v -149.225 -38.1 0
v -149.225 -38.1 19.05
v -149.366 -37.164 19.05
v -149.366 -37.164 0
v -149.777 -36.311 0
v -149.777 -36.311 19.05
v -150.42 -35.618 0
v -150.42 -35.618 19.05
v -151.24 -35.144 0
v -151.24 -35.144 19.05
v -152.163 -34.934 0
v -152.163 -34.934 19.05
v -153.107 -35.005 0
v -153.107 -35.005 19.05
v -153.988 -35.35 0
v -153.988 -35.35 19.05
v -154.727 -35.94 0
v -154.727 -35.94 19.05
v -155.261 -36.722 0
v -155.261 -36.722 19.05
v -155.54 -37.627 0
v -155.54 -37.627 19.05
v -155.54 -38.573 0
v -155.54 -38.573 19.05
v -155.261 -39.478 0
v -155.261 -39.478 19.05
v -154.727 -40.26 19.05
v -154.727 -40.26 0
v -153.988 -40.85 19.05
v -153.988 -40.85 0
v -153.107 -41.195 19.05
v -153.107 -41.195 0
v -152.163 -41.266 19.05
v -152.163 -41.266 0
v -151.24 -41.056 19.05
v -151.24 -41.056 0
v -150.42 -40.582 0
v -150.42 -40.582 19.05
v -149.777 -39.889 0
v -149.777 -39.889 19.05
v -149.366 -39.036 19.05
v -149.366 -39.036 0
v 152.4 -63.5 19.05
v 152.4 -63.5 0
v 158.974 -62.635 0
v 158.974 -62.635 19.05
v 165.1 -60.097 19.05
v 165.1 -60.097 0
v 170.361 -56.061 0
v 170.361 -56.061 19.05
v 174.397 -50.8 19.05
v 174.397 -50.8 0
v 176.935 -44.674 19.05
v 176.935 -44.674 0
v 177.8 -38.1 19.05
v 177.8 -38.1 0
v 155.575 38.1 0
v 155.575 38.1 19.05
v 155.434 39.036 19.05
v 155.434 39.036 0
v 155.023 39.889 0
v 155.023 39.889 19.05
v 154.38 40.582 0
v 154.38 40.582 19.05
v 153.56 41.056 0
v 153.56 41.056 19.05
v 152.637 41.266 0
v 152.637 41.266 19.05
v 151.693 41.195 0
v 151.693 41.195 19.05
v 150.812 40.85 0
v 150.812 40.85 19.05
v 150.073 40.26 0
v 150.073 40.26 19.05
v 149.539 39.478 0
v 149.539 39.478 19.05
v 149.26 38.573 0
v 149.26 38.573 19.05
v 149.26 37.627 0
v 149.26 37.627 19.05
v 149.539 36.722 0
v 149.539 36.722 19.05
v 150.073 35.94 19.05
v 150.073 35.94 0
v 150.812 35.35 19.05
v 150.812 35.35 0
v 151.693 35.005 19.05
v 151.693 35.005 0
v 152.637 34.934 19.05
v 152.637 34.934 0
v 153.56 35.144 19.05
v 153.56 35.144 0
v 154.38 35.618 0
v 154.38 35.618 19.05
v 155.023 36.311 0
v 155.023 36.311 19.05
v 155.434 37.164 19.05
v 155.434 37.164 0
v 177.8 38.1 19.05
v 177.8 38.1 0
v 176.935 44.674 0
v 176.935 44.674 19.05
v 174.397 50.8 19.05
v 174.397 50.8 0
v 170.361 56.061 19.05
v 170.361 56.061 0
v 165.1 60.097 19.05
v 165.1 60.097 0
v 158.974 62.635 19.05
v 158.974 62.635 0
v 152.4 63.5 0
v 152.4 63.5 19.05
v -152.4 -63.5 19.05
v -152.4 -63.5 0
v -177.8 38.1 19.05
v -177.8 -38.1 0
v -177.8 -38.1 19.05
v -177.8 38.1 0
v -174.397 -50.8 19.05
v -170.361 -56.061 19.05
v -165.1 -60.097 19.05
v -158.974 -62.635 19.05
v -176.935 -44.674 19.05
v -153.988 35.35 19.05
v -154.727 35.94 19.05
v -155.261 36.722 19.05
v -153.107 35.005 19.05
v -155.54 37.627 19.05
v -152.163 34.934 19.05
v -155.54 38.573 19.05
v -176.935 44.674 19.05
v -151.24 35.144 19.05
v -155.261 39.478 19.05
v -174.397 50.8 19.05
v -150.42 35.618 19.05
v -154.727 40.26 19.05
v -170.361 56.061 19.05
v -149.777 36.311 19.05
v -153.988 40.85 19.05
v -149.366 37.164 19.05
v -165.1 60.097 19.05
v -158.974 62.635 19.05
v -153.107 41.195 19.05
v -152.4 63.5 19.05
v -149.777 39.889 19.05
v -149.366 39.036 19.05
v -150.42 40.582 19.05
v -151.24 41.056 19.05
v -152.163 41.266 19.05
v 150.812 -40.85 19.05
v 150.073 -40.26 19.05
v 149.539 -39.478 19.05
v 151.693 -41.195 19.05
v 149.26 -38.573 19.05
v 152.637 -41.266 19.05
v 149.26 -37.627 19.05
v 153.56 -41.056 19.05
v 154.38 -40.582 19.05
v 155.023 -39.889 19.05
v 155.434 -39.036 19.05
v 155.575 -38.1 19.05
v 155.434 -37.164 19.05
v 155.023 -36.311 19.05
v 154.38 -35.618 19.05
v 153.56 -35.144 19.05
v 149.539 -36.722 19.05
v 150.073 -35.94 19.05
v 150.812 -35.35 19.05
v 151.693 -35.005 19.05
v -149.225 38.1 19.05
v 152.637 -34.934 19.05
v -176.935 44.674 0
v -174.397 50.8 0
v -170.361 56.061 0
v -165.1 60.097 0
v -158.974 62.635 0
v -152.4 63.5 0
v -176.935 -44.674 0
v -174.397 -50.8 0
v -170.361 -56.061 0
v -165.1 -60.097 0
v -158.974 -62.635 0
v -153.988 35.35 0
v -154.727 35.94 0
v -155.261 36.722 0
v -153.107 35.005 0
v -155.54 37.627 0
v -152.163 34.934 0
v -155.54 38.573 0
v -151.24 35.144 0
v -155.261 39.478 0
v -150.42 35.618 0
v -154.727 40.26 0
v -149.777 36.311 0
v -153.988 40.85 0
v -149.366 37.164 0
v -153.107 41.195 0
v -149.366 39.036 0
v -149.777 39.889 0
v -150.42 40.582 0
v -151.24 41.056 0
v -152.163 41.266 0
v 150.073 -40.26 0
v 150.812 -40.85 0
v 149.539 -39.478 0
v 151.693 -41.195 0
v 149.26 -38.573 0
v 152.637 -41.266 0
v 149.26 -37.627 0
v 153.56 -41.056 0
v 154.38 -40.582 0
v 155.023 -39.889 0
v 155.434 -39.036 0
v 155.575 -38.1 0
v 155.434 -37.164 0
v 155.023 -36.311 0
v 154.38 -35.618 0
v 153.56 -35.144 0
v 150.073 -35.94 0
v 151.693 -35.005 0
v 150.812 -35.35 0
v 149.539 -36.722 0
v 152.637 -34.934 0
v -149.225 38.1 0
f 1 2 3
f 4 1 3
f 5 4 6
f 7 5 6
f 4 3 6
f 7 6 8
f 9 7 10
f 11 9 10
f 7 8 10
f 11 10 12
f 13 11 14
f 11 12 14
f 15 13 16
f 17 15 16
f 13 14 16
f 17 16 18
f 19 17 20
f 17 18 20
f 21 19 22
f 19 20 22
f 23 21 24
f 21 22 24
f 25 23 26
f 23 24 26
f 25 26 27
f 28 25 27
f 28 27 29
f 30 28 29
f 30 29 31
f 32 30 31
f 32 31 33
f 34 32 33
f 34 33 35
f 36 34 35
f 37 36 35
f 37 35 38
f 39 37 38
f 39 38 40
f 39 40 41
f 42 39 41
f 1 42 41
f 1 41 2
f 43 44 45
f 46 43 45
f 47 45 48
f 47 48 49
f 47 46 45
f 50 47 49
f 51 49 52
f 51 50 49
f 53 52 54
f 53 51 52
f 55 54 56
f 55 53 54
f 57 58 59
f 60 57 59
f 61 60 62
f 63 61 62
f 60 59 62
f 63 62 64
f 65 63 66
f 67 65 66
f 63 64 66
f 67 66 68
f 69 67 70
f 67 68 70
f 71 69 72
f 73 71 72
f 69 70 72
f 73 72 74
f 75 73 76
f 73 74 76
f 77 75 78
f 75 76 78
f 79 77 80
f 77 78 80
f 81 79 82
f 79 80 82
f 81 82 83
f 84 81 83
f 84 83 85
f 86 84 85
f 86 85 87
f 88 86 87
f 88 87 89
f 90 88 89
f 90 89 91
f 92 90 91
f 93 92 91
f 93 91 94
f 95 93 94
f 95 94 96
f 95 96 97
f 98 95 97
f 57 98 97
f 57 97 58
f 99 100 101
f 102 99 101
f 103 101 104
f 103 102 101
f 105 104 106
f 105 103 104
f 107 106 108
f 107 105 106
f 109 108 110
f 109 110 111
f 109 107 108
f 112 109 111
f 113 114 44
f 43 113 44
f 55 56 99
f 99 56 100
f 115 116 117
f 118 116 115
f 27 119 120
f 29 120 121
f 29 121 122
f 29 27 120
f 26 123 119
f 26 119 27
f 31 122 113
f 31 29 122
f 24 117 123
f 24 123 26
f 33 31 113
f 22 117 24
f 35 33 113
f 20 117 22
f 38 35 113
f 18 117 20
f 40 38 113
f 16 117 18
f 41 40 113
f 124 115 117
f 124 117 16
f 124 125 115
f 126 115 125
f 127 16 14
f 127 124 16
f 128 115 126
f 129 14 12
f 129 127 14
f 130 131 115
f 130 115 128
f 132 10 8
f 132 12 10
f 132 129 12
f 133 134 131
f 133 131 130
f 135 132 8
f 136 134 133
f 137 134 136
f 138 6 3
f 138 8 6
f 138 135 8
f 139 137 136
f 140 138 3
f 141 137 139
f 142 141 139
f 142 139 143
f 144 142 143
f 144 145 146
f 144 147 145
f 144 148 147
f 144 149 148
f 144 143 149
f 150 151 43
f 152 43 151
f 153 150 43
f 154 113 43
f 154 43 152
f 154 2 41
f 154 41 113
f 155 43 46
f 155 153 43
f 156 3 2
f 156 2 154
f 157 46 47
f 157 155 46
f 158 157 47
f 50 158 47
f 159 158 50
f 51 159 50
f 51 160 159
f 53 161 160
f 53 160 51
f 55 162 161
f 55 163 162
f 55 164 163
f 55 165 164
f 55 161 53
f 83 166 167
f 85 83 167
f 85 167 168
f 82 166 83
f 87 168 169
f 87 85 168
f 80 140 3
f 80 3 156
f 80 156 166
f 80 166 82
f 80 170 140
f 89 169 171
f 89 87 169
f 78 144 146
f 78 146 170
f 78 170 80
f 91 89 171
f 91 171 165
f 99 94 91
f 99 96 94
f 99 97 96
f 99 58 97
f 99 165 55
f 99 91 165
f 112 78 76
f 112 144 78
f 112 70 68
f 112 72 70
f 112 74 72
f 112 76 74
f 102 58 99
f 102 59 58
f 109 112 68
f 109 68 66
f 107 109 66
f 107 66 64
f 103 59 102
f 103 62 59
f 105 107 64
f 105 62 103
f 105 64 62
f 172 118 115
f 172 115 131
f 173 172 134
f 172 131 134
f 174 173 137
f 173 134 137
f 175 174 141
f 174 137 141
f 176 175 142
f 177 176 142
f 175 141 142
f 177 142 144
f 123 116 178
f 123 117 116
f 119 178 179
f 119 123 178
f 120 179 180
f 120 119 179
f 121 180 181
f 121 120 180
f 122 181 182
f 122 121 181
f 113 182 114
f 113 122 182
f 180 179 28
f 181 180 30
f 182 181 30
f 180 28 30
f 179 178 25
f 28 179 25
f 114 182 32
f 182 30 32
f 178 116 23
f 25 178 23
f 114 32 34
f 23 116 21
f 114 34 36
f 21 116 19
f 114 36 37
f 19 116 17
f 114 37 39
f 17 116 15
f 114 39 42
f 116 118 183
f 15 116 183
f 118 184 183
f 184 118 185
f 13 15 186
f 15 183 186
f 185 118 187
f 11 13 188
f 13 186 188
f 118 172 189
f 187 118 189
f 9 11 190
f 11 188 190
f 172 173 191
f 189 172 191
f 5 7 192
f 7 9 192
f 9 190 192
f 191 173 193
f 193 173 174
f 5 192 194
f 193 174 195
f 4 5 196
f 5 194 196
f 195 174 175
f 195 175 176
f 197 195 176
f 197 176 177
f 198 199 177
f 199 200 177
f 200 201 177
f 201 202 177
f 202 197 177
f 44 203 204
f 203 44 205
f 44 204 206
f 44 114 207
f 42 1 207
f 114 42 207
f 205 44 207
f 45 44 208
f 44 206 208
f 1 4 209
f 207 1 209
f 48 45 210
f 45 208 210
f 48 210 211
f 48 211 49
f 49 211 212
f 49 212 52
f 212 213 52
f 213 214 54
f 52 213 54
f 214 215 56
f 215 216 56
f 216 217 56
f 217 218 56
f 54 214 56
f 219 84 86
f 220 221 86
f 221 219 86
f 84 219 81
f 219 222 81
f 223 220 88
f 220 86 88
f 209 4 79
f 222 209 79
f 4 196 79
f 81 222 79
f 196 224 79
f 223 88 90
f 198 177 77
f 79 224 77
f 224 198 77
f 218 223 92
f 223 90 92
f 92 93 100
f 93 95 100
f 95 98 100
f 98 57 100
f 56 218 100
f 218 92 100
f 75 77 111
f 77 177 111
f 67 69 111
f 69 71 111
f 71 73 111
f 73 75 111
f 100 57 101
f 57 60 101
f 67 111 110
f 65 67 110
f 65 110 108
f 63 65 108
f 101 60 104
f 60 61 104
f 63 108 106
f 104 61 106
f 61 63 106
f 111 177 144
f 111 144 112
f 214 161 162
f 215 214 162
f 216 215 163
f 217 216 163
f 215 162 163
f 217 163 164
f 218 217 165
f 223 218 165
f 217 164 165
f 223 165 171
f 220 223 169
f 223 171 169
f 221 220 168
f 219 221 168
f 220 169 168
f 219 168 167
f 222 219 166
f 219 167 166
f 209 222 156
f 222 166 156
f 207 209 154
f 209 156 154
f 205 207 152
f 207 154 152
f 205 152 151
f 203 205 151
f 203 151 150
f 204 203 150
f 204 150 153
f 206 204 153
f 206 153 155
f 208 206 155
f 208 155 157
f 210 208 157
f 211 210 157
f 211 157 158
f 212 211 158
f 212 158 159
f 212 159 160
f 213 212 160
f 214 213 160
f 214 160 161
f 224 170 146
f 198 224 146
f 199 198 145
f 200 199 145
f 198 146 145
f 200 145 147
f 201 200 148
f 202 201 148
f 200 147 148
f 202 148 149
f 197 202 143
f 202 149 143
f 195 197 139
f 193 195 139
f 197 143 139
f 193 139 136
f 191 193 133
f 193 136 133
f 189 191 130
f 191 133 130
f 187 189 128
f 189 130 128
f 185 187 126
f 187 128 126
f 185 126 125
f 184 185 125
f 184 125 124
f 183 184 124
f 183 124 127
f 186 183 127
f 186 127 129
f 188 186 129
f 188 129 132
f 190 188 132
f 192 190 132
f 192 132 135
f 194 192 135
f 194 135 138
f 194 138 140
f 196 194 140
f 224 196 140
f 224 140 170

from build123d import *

# Parameters (mm, degrees)
F0_W     = 355.6
F0_H     = 127
F1_DEPTH = 19.05
F2_R     = 25.4
F3_R     = 3.175
F4_DEPTH = 19.051


with BuildPart() as f1:
    # F0 (on Top) → F1 (new body)
    with BuildSketch(Plane.XY):
        Rectangle(F0_W, F0_H)
    extrude(amount=F1_DEPTH)

    # F2
    f2_edges = [f1.edges().sort_by_distance(p)[0] for p in [
        (-177.8, 63.5, 9.525),
        (-177.8, -63.5, 9.525),
        (177.8, -63.5, 9.525),
        (177.8, 63.5, 9.525),
    ]]
    fillet(f2_edges, radius=F2_R)

    # F3 (on face) → F4 (cut, through all)
    with BuildSketch(Plane.XY.offset(19.05)):
        with Locations((-152.4, 38.1)):
            Circle(F3_R)
        with Locations((-152.4, -38.1)):
            Circle(F3_R)
        with Locations((152.4, 38.1)):
            Circle(F3_R)
        with Locations((152.4, -38.1)):
            Circle(F3_R)
    extrude(amount=-F4_DEPTH, mode=Mode.SUBTRACT)


solid = f1.part
